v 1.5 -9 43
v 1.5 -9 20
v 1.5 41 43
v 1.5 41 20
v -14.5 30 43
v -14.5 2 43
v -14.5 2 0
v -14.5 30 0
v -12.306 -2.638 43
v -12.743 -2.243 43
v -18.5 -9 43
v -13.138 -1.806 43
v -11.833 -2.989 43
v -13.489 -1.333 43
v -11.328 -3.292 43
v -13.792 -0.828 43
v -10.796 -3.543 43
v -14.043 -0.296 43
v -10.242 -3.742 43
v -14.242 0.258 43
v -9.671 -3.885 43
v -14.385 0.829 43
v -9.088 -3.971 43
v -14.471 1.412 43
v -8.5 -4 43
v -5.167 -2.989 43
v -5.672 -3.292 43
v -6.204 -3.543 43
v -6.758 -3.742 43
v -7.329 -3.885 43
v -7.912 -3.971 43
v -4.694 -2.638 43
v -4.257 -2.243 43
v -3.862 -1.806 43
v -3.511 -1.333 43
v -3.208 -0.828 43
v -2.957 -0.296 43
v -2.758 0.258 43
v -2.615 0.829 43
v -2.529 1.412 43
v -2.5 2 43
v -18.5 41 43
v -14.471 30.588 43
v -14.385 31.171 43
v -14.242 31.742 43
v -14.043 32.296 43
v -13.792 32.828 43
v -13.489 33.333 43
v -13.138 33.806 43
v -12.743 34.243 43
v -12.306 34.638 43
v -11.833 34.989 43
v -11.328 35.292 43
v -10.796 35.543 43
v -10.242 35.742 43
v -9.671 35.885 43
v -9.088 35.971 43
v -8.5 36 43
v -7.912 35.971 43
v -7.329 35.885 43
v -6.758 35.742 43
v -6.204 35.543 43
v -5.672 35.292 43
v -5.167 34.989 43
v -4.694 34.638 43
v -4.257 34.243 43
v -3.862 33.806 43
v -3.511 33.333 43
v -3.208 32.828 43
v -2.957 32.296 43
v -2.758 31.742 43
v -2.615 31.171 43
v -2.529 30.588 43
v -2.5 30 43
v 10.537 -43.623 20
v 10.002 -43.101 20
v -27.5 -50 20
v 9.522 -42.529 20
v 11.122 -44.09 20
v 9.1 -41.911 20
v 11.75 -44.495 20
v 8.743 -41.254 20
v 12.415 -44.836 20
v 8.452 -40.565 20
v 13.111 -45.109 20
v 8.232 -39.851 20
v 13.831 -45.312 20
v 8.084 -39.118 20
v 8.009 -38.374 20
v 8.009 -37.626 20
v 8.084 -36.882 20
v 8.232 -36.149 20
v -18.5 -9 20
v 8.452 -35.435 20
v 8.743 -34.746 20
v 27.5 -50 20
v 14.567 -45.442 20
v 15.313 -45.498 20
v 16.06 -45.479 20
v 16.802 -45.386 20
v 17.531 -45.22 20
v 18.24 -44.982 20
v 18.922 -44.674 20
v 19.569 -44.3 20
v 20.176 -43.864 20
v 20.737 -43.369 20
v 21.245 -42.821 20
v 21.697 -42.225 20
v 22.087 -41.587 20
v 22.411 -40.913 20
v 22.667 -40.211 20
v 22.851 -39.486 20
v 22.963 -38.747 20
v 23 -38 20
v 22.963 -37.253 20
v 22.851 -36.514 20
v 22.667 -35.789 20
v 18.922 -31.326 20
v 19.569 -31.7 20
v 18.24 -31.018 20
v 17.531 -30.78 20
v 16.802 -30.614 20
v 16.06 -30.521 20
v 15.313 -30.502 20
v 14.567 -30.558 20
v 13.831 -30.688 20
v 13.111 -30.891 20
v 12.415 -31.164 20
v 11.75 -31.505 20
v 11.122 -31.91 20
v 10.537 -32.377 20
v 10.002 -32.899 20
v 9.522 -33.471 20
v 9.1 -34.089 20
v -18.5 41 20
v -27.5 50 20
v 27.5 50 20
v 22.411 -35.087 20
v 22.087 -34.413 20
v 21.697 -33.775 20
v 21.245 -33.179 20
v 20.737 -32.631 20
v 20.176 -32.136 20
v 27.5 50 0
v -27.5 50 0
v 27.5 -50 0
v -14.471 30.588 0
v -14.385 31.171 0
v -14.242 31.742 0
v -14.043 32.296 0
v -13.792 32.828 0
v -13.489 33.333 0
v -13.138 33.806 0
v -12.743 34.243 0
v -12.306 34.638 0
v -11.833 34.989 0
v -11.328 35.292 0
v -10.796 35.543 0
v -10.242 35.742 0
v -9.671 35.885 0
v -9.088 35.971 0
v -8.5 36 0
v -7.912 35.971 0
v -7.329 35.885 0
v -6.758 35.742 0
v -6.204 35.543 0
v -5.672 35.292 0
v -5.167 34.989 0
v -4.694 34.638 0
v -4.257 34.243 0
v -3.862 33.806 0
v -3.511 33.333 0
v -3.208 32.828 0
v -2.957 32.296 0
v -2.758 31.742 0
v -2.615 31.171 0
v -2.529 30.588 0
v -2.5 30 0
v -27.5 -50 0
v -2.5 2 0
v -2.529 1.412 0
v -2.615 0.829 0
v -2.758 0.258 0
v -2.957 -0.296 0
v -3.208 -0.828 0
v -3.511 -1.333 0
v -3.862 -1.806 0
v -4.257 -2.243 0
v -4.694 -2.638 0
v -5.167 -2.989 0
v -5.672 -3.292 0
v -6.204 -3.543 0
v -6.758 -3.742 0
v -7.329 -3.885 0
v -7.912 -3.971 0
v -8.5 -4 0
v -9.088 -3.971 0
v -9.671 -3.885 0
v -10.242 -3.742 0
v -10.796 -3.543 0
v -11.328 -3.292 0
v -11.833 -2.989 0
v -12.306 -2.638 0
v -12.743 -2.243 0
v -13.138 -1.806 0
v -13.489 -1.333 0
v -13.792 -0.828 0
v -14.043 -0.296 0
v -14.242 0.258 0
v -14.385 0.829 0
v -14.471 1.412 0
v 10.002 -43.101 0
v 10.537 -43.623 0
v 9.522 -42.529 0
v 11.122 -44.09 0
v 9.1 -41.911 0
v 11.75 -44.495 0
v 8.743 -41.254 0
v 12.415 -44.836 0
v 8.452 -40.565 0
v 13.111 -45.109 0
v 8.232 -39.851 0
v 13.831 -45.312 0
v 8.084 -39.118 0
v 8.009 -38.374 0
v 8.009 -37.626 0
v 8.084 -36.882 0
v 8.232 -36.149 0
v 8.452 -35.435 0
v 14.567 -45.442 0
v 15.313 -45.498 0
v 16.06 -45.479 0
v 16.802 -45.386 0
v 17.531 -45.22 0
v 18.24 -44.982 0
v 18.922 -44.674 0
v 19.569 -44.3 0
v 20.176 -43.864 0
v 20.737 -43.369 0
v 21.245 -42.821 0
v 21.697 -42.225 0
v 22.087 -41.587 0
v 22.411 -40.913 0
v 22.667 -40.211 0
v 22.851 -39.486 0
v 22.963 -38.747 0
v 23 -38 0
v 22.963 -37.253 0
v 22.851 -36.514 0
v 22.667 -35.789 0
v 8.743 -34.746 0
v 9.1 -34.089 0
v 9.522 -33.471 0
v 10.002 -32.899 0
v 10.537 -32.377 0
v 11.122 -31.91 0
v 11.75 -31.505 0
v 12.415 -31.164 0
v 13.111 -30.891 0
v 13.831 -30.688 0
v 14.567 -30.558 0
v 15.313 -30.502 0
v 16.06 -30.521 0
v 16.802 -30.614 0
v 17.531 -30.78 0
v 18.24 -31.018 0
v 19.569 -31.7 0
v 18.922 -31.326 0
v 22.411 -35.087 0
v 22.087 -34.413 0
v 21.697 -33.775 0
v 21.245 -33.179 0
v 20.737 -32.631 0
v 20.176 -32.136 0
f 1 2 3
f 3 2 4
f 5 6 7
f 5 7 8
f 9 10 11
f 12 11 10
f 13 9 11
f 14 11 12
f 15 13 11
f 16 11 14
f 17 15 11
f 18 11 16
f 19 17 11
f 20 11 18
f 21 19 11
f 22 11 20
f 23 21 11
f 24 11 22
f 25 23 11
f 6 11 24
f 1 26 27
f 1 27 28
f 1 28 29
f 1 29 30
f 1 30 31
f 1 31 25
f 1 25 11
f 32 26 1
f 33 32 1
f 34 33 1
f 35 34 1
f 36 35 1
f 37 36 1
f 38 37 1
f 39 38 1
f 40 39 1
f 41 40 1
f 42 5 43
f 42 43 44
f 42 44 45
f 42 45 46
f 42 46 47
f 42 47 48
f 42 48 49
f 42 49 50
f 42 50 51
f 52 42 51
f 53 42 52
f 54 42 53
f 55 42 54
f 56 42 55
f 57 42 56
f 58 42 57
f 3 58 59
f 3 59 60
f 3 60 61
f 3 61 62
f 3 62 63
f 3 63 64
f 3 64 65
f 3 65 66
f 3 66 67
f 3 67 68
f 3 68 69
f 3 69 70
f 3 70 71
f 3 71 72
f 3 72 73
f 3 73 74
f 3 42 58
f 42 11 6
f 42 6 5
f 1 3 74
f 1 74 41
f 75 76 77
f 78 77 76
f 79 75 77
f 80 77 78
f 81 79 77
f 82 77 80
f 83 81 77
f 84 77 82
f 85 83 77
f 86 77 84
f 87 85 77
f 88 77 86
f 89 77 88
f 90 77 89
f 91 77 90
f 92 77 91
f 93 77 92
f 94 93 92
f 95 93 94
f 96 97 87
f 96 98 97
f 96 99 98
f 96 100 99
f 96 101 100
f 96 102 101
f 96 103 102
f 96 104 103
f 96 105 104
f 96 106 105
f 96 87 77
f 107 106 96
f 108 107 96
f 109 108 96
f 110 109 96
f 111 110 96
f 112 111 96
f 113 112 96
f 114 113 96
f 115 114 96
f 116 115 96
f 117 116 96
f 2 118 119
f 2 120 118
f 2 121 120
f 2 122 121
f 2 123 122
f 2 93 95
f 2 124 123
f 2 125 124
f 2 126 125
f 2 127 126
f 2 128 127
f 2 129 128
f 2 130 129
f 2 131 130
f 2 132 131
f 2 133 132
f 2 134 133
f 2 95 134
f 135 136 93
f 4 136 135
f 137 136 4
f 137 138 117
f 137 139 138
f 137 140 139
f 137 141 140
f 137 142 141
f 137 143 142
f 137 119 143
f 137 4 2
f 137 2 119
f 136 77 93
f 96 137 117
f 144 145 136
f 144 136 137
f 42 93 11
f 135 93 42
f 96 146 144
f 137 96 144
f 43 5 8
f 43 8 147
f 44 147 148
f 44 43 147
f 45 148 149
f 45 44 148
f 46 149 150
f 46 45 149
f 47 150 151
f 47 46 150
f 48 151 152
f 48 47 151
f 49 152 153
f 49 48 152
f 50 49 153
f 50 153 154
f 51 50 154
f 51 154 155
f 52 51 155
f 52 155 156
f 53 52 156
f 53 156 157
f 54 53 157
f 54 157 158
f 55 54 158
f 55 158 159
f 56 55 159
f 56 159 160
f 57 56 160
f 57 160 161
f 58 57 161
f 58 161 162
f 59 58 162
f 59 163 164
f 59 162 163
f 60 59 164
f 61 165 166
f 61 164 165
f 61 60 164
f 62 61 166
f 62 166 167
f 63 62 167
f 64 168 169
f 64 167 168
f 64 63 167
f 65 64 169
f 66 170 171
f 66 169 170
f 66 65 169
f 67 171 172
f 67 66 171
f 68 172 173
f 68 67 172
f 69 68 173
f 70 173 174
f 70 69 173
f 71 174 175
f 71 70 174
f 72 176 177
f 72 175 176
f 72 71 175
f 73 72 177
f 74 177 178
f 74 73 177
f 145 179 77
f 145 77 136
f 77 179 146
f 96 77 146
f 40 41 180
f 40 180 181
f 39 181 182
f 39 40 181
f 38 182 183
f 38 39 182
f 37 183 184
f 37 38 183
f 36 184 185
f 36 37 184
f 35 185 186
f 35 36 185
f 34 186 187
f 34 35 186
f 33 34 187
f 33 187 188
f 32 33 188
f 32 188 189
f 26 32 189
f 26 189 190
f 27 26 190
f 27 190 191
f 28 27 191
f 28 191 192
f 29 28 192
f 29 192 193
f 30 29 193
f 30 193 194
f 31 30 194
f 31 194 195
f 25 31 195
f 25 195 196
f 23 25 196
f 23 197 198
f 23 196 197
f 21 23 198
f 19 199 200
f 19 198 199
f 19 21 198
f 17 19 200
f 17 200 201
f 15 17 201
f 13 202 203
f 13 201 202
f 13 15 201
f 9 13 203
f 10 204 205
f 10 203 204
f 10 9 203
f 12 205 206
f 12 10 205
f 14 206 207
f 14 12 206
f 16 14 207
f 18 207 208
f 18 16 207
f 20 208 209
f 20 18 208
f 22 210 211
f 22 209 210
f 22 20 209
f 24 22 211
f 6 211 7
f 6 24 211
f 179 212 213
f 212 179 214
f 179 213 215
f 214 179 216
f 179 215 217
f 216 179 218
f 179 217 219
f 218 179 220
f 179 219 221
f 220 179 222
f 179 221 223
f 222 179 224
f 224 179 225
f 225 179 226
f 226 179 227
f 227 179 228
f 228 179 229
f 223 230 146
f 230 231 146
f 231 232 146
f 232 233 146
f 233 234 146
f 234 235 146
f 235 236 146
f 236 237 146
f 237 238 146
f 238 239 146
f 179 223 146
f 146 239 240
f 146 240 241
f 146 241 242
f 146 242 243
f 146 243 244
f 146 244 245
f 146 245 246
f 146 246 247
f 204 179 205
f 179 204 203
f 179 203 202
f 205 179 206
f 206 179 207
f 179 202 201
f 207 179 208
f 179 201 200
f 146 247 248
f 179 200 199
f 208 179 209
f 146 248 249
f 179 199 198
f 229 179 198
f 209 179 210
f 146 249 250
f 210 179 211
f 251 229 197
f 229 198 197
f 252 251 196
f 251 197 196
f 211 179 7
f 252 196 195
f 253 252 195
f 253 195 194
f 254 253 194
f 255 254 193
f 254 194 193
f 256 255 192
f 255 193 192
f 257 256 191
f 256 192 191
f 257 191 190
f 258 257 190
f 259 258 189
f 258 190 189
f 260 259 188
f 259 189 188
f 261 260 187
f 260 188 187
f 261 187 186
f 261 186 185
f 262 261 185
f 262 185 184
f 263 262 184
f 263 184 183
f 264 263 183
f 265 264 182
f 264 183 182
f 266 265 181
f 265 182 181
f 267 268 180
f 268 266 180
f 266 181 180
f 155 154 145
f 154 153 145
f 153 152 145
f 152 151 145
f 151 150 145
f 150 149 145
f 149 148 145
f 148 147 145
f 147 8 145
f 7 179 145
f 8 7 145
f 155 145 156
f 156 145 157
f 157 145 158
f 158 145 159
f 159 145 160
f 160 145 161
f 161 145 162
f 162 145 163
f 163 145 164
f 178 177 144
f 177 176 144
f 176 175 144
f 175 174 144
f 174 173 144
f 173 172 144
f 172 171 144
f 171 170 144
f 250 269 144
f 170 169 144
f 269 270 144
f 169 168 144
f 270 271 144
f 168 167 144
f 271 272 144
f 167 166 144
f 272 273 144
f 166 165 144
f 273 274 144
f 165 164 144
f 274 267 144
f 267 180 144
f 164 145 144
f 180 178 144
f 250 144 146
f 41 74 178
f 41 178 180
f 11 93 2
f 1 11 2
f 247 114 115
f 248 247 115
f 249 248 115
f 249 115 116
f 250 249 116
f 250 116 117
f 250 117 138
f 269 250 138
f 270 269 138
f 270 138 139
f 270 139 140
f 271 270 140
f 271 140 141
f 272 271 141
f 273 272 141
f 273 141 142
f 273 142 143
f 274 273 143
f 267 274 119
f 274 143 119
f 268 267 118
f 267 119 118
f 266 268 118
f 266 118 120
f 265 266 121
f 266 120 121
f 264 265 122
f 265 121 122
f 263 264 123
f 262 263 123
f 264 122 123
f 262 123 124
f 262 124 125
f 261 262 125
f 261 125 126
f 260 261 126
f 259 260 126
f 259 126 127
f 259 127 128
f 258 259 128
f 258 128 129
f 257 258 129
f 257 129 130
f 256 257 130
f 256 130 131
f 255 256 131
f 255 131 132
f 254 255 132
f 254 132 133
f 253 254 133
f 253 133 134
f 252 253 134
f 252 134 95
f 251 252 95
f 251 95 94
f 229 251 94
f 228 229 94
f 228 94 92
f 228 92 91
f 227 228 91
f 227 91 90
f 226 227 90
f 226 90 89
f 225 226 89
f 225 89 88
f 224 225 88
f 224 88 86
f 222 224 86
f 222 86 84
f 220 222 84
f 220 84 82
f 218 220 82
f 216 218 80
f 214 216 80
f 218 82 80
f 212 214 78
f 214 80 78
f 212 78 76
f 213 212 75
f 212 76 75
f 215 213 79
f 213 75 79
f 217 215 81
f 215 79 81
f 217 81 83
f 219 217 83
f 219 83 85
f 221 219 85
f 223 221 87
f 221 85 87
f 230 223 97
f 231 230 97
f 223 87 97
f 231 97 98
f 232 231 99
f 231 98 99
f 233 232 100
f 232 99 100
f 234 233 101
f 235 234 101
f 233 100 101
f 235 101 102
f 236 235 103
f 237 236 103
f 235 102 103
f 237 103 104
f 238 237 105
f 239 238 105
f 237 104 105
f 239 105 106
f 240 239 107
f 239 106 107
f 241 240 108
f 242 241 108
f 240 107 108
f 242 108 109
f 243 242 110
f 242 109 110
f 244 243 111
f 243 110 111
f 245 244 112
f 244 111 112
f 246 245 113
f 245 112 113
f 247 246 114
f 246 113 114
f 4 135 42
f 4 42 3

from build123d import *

# Parameters (mm, degrees)
SKETCH_1_W          = 55
SKETCH_1_H          = 100
EXTRUDE_1_DEPTH     = 20
SKETCH_2_R          = 7.5
CUT_EXTRUDE_1_DEPTH = 61.466933112
SKETCH_3_W          = 20
SKETCH_3_H          = 50
EXTRUDE_2_DEPTH     = 23
CUT_EXTRUDE_2_DEPTH = 72.451032183


with BuildPart() as part:
    # Эскиз1 → Бобышка-Вытянуть1 (new body)
    with BuildSketch(Plane.XY):
        Rectangle(SKETCH_1_W, SKETCH_1_H)
    extrude(amount=EXTRUDE_1_DEPTH)

    # Эскиз2 → Вырез-Вытянуть1 (cut, through all)
    with BuildSketch(Plane.XY.offset(20)):
        with Locations((15.5, -38)):
            Circle(SKETCH_2_R)
    extrude(amount=-CUT_EXTRUDE_1_DEPTH, mode=Mode.SUBTRACT)

    # Эскиз3 → Бобышка-Вытянуть2 (add)
    with BuildSketch(Plane.XY.offset(20)):
        with Locations((-8.5, 16)):
            Rectangle(SKETCH_3_W, SKETCH_3_H)
    extrude(amount=EXTRUDE_2_DEPTH)

    # Эскиз4 → Вырез-Вытянуть2 (cut, through all)
    with BuildSketch(Plane.XY.offset(43)):
        with BuildLine():
            Line((-14.5, 2), (-14.5, 30))
            ThreePointArc((-14.5, 30), (-8.5, 36), (-2.5, 30))
            Line((-2.5, 30), (-2.5, 2))
            ThreePointArc((-2.5, 2), (-8.5, -4), (-14.5, 2))
        make_face()
    extrude(amount=-CUT_EXTRUDE_2_DEPTH, mode=Mode.SUBTRACT)


solid = part.part
